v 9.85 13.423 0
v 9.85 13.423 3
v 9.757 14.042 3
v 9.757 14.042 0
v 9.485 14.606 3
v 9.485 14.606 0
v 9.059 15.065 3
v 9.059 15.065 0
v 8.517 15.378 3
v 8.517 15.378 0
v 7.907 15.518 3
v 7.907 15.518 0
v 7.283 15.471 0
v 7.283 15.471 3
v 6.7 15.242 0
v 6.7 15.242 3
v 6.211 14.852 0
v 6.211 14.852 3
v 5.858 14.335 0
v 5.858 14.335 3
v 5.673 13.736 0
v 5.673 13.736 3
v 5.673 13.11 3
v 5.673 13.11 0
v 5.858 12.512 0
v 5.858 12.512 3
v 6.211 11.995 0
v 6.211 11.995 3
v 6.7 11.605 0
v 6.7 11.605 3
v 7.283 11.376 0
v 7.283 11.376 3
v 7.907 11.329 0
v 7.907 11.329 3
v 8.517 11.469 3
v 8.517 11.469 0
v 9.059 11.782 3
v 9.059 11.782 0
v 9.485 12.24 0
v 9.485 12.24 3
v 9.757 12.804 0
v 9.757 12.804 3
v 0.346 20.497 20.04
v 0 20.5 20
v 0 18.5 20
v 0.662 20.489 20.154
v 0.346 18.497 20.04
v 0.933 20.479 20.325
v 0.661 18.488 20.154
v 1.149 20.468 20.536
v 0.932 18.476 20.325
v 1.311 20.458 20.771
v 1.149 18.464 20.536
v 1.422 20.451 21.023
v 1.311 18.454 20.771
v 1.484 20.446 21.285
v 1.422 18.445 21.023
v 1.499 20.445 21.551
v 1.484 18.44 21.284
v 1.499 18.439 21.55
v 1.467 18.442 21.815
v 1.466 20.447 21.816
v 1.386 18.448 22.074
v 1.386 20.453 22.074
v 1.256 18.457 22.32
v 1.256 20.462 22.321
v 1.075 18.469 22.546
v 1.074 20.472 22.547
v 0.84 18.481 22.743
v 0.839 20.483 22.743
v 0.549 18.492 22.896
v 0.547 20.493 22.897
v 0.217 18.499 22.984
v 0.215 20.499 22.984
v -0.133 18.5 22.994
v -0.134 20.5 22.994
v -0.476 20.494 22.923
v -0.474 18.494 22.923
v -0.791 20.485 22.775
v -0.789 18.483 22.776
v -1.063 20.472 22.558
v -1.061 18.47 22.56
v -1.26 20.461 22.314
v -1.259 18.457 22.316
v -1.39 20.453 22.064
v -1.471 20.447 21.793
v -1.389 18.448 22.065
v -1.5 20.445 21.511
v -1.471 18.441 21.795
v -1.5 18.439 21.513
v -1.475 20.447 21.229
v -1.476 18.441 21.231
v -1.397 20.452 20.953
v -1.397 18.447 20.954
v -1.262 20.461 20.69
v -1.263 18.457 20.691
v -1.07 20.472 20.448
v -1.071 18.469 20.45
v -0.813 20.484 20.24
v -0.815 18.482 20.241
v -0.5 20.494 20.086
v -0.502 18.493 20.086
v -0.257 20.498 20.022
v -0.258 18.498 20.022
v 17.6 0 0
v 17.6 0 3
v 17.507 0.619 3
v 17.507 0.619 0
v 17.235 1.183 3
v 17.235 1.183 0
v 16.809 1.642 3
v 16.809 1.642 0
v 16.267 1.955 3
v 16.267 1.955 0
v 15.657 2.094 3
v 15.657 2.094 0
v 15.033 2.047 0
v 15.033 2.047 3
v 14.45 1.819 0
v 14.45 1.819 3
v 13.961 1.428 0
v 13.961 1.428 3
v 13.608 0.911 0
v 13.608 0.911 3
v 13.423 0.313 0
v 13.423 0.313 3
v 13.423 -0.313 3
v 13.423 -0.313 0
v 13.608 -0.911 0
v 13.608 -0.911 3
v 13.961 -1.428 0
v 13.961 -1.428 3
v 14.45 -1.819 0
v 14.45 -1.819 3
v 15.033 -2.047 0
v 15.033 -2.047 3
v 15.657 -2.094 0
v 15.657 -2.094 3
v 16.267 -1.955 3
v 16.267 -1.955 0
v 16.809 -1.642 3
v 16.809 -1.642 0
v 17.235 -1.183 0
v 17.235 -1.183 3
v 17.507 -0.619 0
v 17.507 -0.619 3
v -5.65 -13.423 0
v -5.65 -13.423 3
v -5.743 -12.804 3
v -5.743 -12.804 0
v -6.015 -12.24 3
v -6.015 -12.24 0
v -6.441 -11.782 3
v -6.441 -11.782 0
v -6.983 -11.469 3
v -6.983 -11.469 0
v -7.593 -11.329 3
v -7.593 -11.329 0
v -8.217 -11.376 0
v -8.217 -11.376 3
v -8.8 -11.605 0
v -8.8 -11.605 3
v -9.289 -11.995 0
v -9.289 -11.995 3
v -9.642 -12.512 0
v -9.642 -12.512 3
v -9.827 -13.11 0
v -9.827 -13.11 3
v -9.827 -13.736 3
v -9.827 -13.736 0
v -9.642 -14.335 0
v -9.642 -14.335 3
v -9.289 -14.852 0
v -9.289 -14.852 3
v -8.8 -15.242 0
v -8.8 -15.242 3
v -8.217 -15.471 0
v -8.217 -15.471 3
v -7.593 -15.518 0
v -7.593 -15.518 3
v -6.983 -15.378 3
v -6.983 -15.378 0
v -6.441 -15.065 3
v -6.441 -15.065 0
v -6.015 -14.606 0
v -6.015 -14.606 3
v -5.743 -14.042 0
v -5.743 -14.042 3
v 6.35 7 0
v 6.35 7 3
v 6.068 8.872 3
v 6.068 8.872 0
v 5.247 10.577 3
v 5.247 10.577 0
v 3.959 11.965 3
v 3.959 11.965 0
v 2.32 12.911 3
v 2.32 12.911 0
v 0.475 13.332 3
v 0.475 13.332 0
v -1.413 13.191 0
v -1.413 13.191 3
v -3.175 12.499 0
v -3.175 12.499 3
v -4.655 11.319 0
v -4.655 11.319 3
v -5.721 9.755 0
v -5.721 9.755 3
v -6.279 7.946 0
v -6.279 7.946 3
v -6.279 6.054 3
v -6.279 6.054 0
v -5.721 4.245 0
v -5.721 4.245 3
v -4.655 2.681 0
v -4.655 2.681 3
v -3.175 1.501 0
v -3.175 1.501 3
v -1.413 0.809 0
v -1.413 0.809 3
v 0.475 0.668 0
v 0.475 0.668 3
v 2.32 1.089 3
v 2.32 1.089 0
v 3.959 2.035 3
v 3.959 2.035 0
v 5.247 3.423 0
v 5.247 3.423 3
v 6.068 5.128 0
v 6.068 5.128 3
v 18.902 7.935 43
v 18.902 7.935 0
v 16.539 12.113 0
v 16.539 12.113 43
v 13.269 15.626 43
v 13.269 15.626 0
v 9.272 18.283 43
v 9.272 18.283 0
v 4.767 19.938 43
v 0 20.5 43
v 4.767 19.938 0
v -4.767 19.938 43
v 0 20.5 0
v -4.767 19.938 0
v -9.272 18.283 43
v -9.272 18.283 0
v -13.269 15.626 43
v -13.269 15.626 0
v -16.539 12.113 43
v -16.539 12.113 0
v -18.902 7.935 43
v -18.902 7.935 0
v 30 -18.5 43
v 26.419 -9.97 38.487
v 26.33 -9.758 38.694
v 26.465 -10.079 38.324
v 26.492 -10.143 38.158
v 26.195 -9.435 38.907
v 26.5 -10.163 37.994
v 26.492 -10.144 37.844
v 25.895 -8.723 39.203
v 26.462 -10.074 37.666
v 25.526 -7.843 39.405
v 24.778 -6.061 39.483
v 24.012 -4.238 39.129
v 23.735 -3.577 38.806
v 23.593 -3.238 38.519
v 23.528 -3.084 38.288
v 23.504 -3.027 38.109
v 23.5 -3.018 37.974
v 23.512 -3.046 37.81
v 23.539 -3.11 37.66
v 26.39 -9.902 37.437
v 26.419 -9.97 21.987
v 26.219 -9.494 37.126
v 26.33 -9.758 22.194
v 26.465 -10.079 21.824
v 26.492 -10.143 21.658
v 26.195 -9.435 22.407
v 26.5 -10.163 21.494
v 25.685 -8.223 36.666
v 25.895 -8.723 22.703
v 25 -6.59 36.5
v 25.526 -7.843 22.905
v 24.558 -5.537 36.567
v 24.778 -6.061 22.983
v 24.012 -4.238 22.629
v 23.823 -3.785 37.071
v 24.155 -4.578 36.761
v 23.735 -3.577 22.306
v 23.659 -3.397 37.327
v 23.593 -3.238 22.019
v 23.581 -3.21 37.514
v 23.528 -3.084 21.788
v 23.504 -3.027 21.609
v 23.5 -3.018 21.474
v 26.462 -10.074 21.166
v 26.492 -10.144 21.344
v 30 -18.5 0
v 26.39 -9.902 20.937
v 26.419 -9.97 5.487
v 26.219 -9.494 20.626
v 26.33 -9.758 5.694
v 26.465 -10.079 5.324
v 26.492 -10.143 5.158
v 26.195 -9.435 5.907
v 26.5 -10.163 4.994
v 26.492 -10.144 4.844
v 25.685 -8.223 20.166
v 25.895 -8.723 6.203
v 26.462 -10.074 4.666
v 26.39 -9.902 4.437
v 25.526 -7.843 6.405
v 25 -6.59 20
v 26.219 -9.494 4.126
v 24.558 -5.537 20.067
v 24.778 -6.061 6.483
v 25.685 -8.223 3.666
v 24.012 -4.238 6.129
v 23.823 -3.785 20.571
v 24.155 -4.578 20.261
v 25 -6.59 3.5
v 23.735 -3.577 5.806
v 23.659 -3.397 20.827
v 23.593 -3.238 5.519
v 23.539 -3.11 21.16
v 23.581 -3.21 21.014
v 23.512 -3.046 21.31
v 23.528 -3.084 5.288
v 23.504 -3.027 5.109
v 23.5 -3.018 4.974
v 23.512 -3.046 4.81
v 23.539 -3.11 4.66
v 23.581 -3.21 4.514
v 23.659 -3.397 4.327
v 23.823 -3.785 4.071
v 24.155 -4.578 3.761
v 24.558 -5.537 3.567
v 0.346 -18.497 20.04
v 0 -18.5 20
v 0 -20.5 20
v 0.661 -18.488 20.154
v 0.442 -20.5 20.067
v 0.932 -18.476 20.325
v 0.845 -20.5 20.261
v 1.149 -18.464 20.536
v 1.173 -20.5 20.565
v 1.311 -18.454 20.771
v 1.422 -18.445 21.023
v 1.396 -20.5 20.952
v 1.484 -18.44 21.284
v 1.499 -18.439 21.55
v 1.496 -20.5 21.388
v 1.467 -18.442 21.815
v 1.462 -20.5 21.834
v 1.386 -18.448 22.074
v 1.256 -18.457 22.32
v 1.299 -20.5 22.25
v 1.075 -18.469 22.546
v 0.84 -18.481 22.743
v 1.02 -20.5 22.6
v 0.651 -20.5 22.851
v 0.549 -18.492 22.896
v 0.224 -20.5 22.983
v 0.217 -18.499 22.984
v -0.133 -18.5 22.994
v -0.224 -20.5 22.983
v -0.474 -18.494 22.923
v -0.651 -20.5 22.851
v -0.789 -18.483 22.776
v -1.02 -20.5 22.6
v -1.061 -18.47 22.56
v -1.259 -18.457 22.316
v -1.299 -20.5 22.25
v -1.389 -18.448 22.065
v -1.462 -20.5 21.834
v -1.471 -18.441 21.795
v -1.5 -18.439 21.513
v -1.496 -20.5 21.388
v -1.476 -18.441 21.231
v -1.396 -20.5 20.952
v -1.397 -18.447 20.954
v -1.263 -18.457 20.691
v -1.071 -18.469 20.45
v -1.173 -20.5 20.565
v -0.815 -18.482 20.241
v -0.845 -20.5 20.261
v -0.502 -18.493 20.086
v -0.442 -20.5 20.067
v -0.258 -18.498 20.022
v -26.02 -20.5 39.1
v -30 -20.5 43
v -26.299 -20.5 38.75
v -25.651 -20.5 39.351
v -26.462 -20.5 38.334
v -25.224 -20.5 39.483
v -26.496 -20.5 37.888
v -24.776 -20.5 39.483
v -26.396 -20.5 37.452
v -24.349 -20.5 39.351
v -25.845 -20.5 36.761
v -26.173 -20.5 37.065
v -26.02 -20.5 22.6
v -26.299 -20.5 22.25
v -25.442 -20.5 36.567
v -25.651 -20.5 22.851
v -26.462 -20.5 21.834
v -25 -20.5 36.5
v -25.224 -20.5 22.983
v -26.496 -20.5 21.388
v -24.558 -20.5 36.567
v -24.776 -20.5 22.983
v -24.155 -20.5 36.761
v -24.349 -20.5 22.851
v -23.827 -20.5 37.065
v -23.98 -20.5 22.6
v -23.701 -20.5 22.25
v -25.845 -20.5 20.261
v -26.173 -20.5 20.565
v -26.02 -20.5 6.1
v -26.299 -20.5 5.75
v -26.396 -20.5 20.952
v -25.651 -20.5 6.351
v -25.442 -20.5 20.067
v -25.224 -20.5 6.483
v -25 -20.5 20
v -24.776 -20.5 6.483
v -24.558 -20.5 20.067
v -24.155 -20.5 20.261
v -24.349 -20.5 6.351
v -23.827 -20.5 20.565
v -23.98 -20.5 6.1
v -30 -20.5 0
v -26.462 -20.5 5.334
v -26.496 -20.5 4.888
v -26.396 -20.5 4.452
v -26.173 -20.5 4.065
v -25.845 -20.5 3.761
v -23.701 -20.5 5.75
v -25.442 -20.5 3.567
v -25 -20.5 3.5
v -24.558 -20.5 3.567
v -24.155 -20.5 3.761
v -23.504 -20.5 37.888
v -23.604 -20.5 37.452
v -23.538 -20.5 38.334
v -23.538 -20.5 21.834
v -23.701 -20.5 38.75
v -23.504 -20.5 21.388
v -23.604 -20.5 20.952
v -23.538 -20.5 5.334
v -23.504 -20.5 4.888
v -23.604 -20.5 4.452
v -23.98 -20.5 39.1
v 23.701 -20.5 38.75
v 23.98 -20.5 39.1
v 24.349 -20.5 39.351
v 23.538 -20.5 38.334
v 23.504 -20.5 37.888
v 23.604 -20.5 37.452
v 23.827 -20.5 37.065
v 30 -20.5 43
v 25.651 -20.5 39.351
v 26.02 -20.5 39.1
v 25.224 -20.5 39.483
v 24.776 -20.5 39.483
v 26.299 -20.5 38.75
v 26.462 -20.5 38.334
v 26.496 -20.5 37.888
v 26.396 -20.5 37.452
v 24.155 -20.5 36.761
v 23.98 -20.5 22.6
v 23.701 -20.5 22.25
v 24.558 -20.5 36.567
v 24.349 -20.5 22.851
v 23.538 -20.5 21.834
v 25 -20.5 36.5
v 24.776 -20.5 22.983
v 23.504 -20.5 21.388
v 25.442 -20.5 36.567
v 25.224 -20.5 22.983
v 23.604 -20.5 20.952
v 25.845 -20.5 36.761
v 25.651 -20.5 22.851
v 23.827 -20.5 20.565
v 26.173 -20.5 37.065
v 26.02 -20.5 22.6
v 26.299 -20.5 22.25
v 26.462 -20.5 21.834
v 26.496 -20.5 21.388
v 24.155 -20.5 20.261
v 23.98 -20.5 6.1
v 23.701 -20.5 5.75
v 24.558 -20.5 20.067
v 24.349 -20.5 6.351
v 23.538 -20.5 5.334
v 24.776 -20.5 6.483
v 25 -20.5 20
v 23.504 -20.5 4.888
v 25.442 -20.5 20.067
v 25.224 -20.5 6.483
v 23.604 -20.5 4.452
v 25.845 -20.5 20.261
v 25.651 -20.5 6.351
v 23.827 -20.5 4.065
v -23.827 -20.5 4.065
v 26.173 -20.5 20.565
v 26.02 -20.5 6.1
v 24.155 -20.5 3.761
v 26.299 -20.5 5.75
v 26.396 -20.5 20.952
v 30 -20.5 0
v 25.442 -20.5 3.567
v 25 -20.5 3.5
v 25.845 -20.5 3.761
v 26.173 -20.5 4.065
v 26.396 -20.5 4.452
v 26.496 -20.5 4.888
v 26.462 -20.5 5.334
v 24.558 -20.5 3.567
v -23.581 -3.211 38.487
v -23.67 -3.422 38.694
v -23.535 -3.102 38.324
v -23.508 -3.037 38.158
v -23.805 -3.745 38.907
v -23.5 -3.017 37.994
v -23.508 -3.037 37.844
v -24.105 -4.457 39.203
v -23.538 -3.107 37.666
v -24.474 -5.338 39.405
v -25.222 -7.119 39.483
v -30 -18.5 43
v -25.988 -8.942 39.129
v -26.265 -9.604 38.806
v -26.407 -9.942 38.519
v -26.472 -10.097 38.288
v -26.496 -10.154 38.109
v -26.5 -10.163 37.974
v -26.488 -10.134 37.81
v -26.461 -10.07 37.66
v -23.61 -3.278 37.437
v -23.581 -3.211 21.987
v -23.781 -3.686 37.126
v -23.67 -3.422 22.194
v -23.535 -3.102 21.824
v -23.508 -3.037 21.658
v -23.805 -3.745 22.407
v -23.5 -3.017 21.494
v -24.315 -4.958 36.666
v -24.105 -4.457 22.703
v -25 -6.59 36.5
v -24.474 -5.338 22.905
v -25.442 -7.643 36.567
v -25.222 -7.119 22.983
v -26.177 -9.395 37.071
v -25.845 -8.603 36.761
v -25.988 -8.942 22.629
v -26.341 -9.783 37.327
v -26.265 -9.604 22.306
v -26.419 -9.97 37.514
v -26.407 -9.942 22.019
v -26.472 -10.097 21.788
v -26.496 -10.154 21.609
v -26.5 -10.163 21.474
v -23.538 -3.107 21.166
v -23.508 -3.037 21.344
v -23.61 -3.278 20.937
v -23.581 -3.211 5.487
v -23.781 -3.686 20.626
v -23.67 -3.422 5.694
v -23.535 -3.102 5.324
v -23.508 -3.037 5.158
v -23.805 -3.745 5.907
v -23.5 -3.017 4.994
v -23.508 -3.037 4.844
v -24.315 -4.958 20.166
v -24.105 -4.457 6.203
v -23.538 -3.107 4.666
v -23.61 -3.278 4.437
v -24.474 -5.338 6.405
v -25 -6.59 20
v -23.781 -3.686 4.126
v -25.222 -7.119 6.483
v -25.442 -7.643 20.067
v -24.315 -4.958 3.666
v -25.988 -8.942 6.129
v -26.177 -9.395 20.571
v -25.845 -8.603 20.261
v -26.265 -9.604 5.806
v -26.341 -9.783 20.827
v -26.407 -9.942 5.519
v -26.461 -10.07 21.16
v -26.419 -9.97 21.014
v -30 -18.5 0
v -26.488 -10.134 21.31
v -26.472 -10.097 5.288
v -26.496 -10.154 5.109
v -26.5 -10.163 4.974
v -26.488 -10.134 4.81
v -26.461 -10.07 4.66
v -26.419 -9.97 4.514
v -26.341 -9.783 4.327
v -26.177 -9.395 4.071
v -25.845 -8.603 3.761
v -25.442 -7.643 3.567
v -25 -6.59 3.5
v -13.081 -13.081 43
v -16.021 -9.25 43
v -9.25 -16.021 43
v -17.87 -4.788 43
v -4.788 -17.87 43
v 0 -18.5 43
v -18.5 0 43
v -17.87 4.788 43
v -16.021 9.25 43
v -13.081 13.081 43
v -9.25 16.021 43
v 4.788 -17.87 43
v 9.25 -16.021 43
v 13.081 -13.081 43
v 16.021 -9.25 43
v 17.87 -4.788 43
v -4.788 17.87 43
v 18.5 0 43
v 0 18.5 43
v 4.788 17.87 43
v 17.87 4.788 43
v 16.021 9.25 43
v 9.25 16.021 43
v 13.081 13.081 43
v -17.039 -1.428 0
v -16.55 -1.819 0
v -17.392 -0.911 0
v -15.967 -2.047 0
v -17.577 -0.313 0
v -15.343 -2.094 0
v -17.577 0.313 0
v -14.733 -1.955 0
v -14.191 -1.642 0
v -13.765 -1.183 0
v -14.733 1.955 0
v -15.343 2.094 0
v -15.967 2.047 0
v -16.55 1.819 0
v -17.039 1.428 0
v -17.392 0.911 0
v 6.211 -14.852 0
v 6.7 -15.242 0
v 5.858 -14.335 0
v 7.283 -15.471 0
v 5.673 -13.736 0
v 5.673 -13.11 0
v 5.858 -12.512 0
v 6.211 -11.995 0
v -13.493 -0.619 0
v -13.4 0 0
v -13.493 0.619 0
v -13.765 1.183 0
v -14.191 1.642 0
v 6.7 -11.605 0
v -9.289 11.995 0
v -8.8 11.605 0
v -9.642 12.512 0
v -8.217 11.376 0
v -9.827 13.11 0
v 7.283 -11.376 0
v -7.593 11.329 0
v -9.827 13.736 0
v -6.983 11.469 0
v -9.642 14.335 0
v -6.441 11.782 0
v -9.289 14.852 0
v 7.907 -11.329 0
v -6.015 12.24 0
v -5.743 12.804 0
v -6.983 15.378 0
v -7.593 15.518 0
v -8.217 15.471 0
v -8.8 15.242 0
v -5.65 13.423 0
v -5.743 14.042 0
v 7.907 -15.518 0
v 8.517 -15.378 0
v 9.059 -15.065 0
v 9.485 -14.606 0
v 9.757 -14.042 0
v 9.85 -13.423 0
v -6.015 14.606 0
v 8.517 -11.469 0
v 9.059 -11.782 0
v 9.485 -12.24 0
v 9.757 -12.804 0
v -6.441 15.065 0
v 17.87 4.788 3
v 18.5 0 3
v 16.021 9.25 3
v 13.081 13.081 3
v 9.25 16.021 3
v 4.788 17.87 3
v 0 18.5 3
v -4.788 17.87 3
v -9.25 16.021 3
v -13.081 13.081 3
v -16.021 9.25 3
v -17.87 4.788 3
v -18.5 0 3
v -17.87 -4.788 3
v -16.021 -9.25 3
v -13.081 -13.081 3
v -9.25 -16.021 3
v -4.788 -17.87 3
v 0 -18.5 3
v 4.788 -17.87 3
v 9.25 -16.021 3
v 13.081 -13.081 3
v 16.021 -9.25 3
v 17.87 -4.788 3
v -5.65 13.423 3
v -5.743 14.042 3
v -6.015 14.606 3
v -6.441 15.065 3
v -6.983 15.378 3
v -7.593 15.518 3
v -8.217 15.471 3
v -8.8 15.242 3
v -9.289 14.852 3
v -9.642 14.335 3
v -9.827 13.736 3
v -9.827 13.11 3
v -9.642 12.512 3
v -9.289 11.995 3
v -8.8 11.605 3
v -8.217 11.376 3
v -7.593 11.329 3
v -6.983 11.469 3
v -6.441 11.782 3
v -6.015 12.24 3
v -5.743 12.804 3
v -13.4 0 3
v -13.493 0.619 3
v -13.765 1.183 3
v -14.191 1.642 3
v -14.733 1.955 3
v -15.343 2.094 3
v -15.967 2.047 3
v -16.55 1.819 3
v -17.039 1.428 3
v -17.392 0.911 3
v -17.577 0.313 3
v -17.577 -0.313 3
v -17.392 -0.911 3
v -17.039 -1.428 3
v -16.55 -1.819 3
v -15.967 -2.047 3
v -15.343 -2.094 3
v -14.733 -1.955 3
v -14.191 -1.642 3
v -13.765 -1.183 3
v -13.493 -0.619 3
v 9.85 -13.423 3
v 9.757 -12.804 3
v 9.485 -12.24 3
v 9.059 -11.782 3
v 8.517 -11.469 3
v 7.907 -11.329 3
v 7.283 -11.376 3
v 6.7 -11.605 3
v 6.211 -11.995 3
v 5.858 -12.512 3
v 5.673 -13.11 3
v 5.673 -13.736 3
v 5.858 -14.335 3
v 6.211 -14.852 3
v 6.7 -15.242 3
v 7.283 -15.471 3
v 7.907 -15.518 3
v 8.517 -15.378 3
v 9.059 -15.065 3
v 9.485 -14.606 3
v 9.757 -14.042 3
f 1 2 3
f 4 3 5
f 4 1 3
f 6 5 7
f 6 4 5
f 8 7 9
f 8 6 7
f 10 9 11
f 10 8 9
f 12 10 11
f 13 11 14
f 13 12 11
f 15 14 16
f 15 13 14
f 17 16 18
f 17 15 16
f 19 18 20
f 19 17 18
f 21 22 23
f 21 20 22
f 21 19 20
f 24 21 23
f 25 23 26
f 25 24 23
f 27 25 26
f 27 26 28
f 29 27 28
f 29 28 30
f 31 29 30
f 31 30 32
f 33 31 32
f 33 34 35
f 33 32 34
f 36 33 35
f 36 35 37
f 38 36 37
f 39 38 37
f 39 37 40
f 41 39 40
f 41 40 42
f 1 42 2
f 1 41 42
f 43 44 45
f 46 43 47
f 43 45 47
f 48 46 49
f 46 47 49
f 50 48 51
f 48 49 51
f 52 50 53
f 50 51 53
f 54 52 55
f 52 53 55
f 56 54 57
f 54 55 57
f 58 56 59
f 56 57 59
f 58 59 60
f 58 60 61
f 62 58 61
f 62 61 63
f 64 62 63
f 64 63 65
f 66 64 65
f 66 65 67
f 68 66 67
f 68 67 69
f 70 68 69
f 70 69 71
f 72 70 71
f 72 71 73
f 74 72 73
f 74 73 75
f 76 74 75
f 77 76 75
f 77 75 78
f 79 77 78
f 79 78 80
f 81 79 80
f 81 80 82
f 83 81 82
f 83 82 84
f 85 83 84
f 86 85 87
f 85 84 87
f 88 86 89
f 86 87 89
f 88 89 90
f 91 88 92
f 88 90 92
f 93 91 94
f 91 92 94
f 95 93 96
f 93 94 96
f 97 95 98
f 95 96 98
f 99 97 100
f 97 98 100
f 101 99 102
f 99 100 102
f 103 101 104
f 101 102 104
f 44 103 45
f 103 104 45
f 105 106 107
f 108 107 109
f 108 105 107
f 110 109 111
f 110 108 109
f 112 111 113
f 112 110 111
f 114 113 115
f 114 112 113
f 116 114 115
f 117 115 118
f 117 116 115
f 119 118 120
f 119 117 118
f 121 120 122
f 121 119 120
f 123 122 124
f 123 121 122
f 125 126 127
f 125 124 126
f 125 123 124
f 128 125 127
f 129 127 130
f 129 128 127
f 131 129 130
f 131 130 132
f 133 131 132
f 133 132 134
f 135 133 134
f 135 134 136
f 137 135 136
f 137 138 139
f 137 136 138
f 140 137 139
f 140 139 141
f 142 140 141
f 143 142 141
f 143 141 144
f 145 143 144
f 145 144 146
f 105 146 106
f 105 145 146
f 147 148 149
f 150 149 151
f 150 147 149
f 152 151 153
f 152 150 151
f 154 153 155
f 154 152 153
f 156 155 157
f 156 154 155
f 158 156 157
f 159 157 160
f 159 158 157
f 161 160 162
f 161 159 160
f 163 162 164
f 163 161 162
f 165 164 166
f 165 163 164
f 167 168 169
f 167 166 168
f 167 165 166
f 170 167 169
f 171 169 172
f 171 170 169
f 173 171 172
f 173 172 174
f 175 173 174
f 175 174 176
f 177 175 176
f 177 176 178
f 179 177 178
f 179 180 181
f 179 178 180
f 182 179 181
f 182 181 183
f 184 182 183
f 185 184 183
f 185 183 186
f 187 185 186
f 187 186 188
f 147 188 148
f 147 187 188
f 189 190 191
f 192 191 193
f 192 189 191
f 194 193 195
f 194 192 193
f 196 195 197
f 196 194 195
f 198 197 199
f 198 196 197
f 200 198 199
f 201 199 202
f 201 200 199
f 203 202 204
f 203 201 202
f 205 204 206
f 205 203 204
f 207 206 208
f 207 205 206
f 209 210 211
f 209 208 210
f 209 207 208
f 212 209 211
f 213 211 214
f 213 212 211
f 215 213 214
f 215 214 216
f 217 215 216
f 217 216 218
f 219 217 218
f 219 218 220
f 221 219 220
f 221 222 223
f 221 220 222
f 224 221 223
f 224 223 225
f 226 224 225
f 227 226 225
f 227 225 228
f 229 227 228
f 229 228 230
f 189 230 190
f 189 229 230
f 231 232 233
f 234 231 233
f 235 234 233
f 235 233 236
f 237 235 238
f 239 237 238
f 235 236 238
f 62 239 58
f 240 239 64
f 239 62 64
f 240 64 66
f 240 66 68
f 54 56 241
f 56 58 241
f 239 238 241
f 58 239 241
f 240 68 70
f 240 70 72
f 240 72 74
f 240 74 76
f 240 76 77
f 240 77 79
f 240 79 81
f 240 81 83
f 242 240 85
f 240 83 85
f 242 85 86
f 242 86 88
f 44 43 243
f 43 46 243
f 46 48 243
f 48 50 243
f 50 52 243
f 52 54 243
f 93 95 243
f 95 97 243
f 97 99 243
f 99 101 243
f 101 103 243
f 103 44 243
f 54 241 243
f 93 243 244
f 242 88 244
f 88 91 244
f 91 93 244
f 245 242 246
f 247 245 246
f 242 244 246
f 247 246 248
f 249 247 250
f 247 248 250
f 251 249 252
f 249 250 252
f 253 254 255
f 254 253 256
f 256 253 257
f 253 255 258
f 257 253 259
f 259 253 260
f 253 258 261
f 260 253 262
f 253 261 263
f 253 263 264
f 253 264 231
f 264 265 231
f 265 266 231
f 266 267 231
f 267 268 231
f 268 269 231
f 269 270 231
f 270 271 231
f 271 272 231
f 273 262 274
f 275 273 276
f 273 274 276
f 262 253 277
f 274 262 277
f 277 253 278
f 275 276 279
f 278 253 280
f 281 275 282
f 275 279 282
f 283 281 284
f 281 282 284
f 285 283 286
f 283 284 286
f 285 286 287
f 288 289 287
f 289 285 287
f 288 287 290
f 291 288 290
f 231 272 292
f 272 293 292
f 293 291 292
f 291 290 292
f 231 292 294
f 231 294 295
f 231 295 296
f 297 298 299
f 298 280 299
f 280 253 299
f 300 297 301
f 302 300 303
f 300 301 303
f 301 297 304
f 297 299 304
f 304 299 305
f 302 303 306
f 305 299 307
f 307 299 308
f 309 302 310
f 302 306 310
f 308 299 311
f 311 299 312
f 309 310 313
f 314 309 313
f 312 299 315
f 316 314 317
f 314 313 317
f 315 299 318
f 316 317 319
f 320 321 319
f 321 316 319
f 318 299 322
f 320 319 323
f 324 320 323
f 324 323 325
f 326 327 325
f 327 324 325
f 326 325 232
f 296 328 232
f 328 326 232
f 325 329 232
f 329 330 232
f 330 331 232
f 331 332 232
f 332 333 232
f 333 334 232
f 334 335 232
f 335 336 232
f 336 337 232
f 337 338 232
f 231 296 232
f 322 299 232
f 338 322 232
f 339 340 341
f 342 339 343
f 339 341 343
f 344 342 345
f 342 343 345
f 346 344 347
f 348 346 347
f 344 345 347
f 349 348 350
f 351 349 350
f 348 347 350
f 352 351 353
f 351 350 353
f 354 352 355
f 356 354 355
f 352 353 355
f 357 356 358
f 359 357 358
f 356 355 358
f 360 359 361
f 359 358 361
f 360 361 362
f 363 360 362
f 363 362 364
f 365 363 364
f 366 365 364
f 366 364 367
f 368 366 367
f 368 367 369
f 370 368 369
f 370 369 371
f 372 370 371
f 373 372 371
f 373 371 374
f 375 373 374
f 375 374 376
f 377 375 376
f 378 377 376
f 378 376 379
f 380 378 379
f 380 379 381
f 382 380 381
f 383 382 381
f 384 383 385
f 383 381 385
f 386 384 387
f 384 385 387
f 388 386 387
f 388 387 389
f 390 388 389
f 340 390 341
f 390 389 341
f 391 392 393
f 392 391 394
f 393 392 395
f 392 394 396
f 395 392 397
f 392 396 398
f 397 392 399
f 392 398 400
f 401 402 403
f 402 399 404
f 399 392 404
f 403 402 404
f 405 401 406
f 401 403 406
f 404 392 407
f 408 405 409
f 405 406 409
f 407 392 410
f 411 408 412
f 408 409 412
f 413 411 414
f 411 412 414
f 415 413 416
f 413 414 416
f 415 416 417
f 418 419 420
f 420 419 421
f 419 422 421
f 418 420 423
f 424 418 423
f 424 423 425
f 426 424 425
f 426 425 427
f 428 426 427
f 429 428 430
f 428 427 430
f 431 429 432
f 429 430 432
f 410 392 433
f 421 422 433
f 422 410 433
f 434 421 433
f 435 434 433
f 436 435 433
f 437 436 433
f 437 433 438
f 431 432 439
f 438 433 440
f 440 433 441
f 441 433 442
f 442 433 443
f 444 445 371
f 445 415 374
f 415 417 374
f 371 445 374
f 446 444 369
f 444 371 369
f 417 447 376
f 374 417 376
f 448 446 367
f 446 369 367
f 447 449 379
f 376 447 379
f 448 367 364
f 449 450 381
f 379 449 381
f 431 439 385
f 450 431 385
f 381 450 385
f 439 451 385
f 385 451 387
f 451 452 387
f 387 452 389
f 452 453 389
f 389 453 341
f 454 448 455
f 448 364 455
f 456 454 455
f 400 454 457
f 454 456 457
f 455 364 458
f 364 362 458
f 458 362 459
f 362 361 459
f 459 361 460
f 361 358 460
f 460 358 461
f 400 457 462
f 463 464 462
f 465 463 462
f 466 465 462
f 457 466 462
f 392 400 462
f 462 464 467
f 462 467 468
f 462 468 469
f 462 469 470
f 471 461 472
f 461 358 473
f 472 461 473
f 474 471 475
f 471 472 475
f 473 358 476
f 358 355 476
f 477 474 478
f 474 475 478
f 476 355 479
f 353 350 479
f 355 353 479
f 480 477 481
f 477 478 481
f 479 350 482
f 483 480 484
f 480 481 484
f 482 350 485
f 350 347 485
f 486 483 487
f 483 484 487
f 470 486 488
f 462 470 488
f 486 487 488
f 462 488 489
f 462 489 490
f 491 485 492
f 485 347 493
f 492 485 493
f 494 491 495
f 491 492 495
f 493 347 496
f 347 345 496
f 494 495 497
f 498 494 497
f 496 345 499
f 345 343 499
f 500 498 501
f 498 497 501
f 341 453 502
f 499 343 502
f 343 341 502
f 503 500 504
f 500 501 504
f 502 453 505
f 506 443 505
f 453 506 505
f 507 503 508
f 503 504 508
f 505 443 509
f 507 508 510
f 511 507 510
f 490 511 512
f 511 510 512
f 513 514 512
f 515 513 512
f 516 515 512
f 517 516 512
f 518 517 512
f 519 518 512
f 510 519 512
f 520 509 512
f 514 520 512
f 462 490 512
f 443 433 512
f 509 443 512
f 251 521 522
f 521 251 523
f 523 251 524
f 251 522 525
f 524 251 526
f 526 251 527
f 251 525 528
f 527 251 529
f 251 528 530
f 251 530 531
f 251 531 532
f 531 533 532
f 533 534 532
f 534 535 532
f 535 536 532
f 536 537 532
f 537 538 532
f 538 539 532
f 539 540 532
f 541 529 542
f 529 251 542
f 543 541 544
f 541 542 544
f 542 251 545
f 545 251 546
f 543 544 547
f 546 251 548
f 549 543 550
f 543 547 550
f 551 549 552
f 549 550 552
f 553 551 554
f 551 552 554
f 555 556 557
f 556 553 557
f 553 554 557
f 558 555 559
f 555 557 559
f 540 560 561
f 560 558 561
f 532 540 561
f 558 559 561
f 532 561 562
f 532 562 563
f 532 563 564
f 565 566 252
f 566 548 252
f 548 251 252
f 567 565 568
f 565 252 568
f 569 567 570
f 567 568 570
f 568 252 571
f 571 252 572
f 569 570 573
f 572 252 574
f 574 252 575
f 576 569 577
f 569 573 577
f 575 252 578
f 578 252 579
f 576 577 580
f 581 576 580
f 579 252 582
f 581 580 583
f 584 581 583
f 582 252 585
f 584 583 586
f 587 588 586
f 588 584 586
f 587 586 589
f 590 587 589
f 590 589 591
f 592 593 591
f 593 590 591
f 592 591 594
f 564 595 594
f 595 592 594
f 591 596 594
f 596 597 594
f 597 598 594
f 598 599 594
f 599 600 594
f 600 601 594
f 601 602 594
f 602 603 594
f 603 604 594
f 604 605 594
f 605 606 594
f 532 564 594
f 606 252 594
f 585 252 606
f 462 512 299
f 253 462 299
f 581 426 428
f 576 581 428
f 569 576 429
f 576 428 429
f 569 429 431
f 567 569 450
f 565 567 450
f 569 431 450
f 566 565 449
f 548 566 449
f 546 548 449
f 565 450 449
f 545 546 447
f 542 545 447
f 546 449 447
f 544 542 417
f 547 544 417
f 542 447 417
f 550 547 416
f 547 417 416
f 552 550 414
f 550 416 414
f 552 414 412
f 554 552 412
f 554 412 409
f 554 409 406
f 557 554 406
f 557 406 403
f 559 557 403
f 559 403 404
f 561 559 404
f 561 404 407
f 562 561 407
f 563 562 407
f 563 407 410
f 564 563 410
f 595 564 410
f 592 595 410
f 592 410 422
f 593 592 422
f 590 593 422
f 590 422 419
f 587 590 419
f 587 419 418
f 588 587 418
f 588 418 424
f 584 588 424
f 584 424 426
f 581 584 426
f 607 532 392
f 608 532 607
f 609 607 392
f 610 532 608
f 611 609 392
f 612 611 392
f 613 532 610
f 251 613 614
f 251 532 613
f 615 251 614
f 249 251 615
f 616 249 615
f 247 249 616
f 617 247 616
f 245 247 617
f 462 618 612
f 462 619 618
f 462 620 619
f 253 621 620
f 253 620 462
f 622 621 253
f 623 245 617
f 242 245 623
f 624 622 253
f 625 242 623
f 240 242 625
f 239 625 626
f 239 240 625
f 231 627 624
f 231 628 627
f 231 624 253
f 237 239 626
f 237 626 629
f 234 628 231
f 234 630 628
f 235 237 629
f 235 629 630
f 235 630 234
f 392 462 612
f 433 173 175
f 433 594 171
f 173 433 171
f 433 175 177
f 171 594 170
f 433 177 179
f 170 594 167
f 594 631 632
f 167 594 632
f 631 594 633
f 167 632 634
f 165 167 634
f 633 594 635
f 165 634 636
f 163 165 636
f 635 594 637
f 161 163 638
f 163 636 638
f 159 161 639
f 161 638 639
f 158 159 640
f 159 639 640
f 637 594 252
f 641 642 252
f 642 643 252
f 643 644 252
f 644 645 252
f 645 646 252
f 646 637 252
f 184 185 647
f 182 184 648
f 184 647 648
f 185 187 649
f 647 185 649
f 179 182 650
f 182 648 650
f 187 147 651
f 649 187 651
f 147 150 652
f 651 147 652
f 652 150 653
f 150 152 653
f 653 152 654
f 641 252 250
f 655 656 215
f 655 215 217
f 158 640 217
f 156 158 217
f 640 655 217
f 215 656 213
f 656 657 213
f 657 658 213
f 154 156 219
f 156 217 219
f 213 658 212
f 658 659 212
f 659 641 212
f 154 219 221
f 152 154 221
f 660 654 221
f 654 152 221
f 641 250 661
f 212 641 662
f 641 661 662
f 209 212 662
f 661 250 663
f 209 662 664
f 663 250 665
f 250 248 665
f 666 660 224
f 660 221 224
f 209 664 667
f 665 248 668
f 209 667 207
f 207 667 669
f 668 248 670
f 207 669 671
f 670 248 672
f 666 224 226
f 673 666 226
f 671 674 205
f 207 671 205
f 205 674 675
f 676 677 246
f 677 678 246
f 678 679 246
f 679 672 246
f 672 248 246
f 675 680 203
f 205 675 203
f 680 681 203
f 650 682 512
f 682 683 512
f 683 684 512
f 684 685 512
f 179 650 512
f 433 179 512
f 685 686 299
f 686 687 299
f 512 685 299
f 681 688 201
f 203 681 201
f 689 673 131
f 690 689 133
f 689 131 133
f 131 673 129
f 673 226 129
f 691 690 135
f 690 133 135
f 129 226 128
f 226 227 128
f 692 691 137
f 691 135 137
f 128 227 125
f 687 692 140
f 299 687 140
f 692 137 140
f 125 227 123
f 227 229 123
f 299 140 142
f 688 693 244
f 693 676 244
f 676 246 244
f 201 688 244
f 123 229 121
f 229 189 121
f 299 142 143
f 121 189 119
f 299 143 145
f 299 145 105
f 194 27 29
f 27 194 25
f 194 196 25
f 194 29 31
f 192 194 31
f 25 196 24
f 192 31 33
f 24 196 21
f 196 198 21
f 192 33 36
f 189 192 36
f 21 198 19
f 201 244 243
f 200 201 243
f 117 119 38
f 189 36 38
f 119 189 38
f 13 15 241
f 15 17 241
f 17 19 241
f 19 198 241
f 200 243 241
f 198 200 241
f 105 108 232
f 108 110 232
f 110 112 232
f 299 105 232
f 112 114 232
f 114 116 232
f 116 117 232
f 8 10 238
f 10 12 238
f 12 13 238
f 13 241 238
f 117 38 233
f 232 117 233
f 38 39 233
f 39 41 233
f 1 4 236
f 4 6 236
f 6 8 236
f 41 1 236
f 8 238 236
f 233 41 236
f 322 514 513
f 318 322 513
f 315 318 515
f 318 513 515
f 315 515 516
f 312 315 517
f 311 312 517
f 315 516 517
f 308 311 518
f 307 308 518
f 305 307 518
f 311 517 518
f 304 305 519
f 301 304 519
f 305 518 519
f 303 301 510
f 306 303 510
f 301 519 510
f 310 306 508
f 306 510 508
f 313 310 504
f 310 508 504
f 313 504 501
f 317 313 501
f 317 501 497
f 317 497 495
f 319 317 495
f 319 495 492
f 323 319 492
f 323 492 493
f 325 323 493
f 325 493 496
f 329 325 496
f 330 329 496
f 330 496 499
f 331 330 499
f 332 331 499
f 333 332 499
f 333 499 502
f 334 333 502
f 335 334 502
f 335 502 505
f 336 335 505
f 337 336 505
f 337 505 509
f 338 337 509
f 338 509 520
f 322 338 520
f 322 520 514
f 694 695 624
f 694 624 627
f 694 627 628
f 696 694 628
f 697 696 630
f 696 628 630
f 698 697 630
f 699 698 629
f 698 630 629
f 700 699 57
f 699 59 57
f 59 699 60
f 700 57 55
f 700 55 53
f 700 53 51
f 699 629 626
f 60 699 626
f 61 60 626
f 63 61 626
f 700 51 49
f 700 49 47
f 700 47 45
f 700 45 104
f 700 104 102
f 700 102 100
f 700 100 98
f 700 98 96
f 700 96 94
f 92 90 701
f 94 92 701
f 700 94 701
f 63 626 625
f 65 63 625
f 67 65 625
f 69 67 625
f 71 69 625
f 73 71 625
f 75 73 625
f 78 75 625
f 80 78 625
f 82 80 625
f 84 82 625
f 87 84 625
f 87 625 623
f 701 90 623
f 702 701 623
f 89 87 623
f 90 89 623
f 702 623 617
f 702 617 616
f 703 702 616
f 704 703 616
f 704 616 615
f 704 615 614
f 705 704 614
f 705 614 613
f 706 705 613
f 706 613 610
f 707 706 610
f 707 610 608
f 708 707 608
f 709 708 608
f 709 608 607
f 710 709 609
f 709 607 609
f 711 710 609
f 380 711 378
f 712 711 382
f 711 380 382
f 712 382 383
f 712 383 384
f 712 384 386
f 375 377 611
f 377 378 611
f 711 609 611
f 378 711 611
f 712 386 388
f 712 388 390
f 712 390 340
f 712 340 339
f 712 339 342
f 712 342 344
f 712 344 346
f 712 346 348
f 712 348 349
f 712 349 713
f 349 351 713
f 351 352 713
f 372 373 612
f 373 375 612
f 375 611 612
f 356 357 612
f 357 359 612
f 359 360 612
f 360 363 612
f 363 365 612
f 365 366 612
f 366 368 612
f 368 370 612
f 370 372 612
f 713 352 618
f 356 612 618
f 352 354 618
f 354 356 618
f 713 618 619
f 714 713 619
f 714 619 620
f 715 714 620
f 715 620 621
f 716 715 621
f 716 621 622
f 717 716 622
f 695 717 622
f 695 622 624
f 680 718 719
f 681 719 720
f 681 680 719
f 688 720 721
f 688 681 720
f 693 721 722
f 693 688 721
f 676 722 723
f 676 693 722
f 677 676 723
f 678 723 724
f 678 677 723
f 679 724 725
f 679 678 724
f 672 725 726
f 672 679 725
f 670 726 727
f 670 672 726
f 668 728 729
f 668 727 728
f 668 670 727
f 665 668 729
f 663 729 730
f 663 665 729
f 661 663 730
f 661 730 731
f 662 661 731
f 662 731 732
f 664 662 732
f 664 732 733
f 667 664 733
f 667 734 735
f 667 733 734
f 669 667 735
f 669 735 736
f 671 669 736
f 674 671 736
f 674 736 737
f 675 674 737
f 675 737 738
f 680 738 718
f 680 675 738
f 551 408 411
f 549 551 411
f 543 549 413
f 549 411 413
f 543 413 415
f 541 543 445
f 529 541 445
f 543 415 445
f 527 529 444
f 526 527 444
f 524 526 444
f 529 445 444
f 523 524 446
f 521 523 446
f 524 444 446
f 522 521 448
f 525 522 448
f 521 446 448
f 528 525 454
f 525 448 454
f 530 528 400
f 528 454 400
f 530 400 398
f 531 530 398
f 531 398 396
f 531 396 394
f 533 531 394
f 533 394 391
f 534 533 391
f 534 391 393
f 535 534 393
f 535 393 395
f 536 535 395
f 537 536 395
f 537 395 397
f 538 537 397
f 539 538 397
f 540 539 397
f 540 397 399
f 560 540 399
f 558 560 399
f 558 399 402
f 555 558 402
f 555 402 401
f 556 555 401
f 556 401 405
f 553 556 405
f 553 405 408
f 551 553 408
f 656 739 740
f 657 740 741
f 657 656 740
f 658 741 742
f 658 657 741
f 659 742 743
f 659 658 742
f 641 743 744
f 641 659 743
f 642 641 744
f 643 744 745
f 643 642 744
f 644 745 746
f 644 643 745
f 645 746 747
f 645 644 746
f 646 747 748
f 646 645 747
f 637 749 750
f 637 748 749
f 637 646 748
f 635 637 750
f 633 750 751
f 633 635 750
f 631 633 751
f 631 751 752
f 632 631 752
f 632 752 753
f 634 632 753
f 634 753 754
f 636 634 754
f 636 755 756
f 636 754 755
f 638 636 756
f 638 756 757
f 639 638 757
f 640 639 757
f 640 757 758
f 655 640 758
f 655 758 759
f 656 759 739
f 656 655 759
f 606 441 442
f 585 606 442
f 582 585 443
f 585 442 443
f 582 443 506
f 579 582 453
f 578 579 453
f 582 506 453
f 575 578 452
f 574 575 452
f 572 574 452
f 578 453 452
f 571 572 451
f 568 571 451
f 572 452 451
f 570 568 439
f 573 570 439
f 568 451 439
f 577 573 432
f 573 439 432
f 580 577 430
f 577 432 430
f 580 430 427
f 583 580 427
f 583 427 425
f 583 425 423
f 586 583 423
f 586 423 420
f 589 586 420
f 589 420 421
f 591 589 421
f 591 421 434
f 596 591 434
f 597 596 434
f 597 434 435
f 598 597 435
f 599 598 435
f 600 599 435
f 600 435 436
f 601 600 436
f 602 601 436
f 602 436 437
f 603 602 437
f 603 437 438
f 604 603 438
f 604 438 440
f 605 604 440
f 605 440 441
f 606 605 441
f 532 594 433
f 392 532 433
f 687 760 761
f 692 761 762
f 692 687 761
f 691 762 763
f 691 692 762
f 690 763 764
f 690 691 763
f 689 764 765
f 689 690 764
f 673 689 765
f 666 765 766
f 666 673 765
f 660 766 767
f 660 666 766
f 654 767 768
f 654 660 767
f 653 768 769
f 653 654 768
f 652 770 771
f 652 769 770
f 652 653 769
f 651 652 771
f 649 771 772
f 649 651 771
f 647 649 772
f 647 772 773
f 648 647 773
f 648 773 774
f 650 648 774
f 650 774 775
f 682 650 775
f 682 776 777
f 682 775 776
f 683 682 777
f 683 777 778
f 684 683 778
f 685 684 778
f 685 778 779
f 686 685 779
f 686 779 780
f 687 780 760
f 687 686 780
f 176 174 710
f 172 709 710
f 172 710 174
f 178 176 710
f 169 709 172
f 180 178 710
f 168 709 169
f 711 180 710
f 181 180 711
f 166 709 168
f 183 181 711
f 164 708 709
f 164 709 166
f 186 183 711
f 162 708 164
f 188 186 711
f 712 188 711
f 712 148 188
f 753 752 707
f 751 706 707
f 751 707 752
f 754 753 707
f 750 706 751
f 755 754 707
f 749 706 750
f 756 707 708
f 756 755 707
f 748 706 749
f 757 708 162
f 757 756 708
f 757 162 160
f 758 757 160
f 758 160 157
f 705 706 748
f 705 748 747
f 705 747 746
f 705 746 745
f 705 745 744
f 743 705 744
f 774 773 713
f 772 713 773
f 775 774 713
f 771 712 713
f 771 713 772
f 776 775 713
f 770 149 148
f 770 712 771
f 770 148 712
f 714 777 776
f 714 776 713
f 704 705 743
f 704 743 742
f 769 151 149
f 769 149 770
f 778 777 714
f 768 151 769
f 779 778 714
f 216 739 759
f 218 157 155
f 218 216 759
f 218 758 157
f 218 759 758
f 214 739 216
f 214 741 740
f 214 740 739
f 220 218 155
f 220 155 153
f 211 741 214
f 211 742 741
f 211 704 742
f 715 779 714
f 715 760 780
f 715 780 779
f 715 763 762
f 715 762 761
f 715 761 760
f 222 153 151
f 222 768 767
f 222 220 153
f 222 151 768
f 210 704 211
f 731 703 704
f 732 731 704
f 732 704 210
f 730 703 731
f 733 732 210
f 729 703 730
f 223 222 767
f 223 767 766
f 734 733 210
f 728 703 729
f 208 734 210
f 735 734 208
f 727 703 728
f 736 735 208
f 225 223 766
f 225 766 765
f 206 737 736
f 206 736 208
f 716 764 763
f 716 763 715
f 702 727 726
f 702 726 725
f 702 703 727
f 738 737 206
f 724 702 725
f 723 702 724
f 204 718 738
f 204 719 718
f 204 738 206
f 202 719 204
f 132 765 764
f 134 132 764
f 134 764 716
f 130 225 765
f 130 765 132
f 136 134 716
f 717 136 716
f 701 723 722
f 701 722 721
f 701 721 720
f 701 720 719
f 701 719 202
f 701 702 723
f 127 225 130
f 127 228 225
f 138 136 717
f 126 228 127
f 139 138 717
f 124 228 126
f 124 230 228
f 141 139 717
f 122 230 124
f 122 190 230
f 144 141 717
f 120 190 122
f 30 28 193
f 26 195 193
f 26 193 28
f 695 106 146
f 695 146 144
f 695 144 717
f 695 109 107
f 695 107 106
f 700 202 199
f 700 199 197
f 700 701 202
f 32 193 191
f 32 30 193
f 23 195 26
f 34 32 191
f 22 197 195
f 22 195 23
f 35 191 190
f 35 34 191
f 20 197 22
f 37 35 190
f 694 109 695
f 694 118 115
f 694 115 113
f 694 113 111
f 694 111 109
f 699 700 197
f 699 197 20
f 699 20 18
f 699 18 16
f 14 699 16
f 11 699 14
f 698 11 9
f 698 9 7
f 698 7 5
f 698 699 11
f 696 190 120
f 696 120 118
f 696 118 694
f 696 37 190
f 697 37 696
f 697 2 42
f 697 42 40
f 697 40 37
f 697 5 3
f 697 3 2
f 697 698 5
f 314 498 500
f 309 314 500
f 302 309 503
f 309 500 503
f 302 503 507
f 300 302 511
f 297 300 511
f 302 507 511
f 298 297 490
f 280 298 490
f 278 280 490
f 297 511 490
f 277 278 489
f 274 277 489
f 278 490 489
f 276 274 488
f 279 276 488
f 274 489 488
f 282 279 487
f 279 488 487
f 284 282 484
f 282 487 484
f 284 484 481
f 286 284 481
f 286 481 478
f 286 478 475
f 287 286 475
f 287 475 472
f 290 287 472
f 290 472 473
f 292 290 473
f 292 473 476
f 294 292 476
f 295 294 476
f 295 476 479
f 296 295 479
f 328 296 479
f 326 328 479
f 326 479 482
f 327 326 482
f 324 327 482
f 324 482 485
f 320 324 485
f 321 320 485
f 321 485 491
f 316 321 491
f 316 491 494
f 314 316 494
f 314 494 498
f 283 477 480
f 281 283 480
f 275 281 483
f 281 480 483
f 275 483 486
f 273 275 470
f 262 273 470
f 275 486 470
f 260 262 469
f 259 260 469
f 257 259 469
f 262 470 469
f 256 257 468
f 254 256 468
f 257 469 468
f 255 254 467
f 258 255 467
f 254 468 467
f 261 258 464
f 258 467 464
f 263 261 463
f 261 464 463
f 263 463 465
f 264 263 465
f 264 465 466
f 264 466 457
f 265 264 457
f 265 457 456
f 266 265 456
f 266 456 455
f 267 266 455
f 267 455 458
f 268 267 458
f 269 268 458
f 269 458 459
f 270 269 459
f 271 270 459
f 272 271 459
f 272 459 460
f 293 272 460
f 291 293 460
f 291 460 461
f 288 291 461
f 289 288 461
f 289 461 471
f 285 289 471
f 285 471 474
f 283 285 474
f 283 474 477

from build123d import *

# Parameters (mm, degrees)
SKETCH_1_R          = 18.5
SKETCH_1_R_2        = 2.1
SKETCH_1_R_3        = 6.35
EXTRUDE_1_DEPTH     = 43
SKETCH_2_R          = 18.5
CUT_EXTRUDE_1_DEPTH = 40
SKETCH_3_R          = 1.5
CUT_EXTRUDE_2_DEPTH = 40
SKETCH_4_R          = 1.5
CUT_EXTRUDE_3_DEPTH = 100


with BuildPart() as part:
    # Эскиз1 → Бобышка-Вытянуть1 (new body)
    # profile 1 of 2: a face of its own
    with BuildSketch(Plane.XY):
        with BuildLine():
            Line((30, -18.5), (18.901833927, 7.935406367))
            ThreePointArc((18.901833927, 7.935406367), (0, 20.5), (-18.901833927, 7.935406367))
            Line((-18.901833927, 7.935406367), (-30, -18.5))
            Line((-30, -18.5), (-30, -20.5))
            Line((-30, -20.5), (0, -20.5))
            Line((0, -20.5), (30, -20.5))
            Line((30, -20.5), (30, -18.5))
        make_face()
        Circle(SKETCH_1_R, mode=Mode.SUBTRACT)
    # profile 2 of 2: a face of its own
    with BuildSketch(Plane.XY):
        Circle(SKETCH_1_R)
        with Locations((7.75, 13.423393759)):
            Circle(SKETCH_1_R_2, mode=Mode.SUBTRACT)
        with Locations((-7.75, 13.423393759)):
            Circle(SKETCH_1_R_2, mode=Mode.SUBTRACT)
        with Locations((-15.5, 0)):
            Circle(SKETCH_1_R_2, mode=Mode.SUBTRACT)
        with Locations((-7.75, -13.423393759)):
            Circle(SKETCH_1_R_2, mode=Mode.SUBTRACT)
        with Locations((7.75, -13.423393759)):
            Circle(SKETCH_1_R_2, mode=Mode.SUBTRACT)
        with Locations((15.5, 0)):
            Circle(SKETCH_1_R_2, mode=Mode.SUBTRACT)
        with Locations((0, 7)):
            Circle(SKETCH_1_R_3, mode=Mode.SUBTRACT)
    extrude(amount=EXTRUDE_1_DEPTH)

    # Эскиз2 → Вырез-Вытянуть1 (cut)
    with BuildSketch(Plane.XY.offset(43)):
        Circle(SKETCH_2_R)
    extrude(amount=-CUT_EXTRUDE_1_DEPTH, mode=Mode.SUBTRACT)

    # Эскиз3 → Вырез-Вытянуть2 (cut)
    with BuildSketch(Plane(origin=(0, -20.5, 0), x_dir=(-1, 0, 0), z_dir=(0, -1, 0))):
        with Locations(Location((25, -38, 0), (0, 0, 90))):
            Circle(SKETCH_3_R)
        with Locations(Location((25, -21.5, 0), (0, 0, 90))):
            Circle(SKETCH_3_R)
        with Locations(Location((25, -5, 0), (0, 0, 90))):
            Circle(SKETCH_3_R)
        with Locations(Location((-25, -38, 0), (0, 0, 90))):
            Circle(SKETCH_3_R)
        with Locations(Location((-25, -21.5, 0), (0, 0, 90))):
            Circle(SKETCH_3_R)
        with Locations(Location((-25, -5, 0), (0, 0, 90))):
            Circle(SKETCH_3_R)
    extrude(amount=-CUT_EXTRUDE_2_DEPTH, mode=Mode.SUBTRACT)

    # Эскиз4 → Вырез-Вытянуть3 (cut)
    with BuildSketch(Plane(origin=(0, -20.5, 0), x_dir=(-1, 0, 0), z_dir=(0, -1, 0))):
        with Locations(Location((0, -21.5, 0), (0, 0, 90))):
            Circle(SKETCH_4_R)
    extrude(amount=-CUT_EXTRUDE_3_DEPTH, mode=Mode.SUBTRACT)


solid = part.part
